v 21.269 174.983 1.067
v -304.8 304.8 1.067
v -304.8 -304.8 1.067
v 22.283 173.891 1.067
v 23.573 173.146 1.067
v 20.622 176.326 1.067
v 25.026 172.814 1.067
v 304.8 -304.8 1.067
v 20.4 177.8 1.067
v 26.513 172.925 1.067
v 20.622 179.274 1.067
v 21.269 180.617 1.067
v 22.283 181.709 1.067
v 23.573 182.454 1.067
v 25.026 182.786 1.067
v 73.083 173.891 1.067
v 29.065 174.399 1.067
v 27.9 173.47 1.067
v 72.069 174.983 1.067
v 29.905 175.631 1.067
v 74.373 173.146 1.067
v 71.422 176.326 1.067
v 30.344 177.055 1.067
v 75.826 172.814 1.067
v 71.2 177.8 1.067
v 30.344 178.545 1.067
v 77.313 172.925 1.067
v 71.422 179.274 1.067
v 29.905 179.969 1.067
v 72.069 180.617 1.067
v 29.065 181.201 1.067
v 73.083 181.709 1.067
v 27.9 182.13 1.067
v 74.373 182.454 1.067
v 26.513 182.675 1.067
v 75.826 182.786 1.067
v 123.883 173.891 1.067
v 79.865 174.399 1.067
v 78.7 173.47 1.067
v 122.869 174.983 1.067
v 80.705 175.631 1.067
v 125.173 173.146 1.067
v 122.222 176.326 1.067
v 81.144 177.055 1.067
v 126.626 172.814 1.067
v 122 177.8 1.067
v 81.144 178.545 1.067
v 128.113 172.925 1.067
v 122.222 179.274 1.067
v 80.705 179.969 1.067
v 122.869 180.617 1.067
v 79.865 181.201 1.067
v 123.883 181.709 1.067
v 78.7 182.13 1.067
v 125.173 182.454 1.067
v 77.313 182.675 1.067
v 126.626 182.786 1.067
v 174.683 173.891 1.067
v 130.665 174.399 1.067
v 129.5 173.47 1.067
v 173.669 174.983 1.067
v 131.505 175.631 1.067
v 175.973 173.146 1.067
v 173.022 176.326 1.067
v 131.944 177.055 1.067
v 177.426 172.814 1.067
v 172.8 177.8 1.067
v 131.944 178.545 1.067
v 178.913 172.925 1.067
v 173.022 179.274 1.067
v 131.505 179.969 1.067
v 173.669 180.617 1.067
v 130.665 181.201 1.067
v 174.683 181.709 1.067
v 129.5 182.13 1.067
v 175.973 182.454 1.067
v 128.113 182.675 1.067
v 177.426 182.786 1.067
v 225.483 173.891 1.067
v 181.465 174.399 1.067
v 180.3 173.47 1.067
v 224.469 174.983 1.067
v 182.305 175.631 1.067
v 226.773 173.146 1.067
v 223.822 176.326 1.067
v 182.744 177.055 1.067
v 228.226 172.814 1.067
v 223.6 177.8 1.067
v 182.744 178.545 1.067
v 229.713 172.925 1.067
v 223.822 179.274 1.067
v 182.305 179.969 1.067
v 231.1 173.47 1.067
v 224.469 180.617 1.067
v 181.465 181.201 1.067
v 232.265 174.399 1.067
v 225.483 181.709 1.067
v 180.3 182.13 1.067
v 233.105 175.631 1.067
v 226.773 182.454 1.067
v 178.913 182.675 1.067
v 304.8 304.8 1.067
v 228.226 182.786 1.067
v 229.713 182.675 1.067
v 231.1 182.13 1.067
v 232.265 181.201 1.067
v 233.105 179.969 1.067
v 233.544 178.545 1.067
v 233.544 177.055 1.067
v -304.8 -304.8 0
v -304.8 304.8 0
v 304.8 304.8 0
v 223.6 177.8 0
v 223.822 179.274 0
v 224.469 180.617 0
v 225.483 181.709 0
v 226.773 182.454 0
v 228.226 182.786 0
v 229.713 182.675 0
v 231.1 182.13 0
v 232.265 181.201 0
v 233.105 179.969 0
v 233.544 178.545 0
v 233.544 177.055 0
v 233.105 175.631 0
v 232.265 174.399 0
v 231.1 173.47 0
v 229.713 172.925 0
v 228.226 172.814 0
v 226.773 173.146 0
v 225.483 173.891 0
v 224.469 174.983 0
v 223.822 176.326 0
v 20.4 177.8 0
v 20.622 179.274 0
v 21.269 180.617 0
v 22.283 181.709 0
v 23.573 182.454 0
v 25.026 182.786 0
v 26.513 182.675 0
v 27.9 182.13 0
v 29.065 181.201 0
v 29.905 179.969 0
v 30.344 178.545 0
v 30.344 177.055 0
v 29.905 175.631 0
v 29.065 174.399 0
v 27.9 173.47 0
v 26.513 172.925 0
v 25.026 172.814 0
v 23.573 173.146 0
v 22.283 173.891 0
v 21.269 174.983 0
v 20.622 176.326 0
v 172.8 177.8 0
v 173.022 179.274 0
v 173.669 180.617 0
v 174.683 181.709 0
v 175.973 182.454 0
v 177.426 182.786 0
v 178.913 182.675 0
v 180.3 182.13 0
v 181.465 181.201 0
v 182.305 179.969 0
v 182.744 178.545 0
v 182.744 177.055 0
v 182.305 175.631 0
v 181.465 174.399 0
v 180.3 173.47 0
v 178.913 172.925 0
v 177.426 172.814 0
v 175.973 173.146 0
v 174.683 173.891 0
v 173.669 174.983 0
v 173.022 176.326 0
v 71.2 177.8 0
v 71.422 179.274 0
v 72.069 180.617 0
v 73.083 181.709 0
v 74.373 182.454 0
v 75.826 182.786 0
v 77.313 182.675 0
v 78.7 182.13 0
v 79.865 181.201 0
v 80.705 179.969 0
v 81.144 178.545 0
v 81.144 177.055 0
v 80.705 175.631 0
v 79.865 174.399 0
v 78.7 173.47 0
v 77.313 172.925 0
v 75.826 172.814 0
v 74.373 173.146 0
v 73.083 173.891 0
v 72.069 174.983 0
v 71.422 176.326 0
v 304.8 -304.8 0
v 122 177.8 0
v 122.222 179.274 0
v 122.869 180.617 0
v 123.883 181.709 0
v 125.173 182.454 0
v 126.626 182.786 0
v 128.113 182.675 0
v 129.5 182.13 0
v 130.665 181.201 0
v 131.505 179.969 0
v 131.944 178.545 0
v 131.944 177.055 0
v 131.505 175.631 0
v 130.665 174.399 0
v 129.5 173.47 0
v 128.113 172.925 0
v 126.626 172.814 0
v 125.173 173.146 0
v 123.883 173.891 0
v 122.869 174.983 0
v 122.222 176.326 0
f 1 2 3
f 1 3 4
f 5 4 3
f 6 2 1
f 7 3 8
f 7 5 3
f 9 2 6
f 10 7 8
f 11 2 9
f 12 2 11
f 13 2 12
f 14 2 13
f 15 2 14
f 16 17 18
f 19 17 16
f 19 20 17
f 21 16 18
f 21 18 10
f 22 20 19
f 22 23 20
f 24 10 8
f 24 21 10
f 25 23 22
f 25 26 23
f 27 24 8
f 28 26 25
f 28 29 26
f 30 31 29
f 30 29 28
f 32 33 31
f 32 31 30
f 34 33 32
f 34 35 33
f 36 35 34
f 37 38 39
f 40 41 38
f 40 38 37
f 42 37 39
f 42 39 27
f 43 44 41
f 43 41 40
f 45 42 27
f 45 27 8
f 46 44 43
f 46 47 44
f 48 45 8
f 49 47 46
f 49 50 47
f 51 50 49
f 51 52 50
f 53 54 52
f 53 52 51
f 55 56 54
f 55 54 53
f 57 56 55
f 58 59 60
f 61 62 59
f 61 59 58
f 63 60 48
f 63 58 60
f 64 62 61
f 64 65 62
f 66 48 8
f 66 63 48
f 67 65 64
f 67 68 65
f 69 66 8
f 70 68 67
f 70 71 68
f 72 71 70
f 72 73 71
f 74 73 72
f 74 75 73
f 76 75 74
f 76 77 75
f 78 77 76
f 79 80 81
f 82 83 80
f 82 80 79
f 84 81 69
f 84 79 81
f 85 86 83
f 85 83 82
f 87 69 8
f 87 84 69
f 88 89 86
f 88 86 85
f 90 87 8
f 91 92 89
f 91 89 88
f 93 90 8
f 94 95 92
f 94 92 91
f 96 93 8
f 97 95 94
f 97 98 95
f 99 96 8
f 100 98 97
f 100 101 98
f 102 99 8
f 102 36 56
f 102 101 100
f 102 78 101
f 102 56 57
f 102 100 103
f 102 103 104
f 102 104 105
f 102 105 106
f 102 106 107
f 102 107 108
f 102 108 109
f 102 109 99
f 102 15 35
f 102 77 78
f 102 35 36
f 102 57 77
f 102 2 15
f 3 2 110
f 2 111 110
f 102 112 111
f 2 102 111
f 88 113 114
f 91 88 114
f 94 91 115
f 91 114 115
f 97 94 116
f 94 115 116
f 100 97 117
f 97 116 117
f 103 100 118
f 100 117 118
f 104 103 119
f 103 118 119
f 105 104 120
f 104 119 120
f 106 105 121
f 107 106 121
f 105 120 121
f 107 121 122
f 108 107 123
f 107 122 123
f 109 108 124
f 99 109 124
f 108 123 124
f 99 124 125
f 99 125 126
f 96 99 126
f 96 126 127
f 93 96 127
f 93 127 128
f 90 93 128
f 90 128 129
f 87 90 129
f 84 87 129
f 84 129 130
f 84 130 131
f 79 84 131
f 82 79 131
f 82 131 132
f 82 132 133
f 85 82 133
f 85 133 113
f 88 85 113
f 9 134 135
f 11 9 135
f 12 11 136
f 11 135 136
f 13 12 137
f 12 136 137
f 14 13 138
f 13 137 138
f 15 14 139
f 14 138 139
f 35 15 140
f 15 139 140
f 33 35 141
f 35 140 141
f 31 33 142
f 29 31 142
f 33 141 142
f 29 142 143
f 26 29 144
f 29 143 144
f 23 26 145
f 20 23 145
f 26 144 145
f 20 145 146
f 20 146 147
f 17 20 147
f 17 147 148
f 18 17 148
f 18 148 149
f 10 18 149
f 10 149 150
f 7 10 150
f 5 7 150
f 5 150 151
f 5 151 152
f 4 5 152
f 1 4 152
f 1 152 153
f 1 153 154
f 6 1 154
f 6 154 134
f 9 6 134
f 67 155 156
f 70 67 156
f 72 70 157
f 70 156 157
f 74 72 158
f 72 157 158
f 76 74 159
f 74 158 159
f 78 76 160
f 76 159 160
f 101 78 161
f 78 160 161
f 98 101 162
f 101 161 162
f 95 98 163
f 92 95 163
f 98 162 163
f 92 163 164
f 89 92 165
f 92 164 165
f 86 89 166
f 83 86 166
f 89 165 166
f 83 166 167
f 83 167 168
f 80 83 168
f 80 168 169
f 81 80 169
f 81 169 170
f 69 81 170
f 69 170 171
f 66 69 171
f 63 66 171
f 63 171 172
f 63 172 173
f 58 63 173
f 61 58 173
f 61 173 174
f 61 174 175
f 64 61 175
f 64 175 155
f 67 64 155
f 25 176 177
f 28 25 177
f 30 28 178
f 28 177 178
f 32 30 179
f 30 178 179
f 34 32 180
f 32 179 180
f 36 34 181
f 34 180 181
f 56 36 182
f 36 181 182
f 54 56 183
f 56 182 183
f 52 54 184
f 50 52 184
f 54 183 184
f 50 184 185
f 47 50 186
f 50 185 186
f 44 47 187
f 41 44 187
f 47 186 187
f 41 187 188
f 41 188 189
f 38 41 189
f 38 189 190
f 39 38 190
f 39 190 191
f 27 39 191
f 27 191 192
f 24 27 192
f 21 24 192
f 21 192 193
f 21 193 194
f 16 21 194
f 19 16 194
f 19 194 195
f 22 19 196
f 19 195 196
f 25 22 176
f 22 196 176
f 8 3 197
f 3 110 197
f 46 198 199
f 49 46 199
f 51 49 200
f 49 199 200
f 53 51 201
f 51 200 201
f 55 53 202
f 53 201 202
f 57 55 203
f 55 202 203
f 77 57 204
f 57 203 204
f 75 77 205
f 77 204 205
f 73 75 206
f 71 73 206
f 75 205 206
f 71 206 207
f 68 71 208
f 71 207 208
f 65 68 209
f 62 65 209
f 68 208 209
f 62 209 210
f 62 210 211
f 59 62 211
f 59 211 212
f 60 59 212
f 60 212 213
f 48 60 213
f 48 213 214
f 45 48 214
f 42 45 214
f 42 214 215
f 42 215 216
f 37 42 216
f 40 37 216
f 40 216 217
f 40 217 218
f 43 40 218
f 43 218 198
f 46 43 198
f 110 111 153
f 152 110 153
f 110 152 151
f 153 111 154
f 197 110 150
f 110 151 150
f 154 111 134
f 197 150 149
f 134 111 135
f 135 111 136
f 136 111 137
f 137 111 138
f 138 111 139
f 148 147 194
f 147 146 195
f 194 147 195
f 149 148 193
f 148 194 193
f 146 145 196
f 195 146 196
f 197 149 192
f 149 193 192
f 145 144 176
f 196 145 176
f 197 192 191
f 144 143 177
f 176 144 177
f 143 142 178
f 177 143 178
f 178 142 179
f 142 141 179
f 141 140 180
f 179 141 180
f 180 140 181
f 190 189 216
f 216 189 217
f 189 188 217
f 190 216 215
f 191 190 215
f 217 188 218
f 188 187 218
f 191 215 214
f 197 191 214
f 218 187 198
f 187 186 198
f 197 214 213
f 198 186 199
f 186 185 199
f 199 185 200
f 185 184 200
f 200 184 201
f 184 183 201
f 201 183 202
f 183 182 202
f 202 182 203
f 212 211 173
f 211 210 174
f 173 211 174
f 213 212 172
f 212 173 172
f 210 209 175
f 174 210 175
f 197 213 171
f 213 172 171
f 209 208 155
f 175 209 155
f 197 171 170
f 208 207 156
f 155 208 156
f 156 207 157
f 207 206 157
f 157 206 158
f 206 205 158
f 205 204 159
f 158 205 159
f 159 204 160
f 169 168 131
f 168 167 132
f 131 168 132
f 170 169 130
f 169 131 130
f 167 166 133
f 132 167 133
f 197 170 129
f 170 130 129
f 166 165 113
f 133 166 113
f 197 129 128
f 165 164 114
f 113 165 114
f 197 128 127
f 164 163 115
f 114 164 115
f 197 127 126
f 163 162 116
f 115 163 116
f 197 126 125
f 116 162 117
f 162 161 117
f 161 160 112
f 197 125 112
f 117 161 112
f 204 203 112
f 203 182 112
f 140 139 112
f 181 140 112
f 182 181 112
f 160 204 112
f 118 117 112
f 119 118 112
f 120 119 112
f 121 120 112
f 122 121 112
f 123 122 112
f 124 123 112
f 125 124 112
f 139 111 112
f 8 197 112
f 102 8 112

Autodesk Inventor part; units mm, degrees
ref_plane "YZ Plane" through (0, 0, 0) normal (1, 0, 0) x (0, 1, 0)
ref_plane "XZ Plane" through (0, 0, 0) normal (0, 1, 0) x (-1, 0, 0)
ref_plane "XY Plane" through (0, 0, 0) normal (0, 0, 1) x (1, 0, 0)
sketch "Sketch1" plane through (0, 0, 0) normal (0, 0, 1) x (1, 0, 0)
  line L0 (-304.8, -304.8) -> (304.8, -304.8)
  line L1 (304.8, -304.8) -> (304.8, 304.8)
  line L2 (304.8, 304.8) -> (-304.8, 304.8)
  line L3 (-304.8, 304.8) -> (-304.8, -304.8)
  line L4 (-304.8, -304.8) -> (304.8, 304.8) construction
  line L5 (304.8, -304.8) -> (-304.8, 304.8) construction
  point P0 (0, 0)
  dimension "d0" = 609.6
  dimension "d1" = 609.6
extrude "Extrusion1" add sketch "Sketch1" along normal blind 1.0668
sketch "Sketch2" plane through (0, 0, 0) normal (0, 0, -1) x (-1, 0, 0)
  line L0 (304.8, -304.8) -> (-304.8, -304.8) projected
  line L1 (304.8, 304.8) -> (304.8, -304.8) projected
  line L2 (-304.8, 304.8) -> (304.8, 304.8) projected
  line L3 (-304.8, -304.8) -> (-304.8, 304.8) projected
  line L4 (-304.8, -304.8) -> (-304.8, 304.8) projected
  line L5 (-304.8, 177.8) -> (304.8, 177.8) construction
  line L6 (304.8, 304.8) -> (304.8, -304.8) projected
  circle A0 centre (-228.6, 177.8) radius 5
  circle A1 centre (-177.8, 177.8) radius 5
  circle A2 centre (-127, 177.8) radius 5
  circle A3 centre (-76.2, 177.8) radius 5
  circle A4 centre (-25.4, 177.8) radius 5
  point P0 (0, 0)
  dimension "d4" = 127
  dimension "d5" = 10
  dimension "d6" = 76.2
  dimension "d9" = 50.8
extrude "Extrusion2" cut sketch "Sketch2" against normal through all contours A0 | A1 | A2 | A3 | A4
properties part number "2221B_Copper Box Side_Feedthrough_V1" material "Copper"
